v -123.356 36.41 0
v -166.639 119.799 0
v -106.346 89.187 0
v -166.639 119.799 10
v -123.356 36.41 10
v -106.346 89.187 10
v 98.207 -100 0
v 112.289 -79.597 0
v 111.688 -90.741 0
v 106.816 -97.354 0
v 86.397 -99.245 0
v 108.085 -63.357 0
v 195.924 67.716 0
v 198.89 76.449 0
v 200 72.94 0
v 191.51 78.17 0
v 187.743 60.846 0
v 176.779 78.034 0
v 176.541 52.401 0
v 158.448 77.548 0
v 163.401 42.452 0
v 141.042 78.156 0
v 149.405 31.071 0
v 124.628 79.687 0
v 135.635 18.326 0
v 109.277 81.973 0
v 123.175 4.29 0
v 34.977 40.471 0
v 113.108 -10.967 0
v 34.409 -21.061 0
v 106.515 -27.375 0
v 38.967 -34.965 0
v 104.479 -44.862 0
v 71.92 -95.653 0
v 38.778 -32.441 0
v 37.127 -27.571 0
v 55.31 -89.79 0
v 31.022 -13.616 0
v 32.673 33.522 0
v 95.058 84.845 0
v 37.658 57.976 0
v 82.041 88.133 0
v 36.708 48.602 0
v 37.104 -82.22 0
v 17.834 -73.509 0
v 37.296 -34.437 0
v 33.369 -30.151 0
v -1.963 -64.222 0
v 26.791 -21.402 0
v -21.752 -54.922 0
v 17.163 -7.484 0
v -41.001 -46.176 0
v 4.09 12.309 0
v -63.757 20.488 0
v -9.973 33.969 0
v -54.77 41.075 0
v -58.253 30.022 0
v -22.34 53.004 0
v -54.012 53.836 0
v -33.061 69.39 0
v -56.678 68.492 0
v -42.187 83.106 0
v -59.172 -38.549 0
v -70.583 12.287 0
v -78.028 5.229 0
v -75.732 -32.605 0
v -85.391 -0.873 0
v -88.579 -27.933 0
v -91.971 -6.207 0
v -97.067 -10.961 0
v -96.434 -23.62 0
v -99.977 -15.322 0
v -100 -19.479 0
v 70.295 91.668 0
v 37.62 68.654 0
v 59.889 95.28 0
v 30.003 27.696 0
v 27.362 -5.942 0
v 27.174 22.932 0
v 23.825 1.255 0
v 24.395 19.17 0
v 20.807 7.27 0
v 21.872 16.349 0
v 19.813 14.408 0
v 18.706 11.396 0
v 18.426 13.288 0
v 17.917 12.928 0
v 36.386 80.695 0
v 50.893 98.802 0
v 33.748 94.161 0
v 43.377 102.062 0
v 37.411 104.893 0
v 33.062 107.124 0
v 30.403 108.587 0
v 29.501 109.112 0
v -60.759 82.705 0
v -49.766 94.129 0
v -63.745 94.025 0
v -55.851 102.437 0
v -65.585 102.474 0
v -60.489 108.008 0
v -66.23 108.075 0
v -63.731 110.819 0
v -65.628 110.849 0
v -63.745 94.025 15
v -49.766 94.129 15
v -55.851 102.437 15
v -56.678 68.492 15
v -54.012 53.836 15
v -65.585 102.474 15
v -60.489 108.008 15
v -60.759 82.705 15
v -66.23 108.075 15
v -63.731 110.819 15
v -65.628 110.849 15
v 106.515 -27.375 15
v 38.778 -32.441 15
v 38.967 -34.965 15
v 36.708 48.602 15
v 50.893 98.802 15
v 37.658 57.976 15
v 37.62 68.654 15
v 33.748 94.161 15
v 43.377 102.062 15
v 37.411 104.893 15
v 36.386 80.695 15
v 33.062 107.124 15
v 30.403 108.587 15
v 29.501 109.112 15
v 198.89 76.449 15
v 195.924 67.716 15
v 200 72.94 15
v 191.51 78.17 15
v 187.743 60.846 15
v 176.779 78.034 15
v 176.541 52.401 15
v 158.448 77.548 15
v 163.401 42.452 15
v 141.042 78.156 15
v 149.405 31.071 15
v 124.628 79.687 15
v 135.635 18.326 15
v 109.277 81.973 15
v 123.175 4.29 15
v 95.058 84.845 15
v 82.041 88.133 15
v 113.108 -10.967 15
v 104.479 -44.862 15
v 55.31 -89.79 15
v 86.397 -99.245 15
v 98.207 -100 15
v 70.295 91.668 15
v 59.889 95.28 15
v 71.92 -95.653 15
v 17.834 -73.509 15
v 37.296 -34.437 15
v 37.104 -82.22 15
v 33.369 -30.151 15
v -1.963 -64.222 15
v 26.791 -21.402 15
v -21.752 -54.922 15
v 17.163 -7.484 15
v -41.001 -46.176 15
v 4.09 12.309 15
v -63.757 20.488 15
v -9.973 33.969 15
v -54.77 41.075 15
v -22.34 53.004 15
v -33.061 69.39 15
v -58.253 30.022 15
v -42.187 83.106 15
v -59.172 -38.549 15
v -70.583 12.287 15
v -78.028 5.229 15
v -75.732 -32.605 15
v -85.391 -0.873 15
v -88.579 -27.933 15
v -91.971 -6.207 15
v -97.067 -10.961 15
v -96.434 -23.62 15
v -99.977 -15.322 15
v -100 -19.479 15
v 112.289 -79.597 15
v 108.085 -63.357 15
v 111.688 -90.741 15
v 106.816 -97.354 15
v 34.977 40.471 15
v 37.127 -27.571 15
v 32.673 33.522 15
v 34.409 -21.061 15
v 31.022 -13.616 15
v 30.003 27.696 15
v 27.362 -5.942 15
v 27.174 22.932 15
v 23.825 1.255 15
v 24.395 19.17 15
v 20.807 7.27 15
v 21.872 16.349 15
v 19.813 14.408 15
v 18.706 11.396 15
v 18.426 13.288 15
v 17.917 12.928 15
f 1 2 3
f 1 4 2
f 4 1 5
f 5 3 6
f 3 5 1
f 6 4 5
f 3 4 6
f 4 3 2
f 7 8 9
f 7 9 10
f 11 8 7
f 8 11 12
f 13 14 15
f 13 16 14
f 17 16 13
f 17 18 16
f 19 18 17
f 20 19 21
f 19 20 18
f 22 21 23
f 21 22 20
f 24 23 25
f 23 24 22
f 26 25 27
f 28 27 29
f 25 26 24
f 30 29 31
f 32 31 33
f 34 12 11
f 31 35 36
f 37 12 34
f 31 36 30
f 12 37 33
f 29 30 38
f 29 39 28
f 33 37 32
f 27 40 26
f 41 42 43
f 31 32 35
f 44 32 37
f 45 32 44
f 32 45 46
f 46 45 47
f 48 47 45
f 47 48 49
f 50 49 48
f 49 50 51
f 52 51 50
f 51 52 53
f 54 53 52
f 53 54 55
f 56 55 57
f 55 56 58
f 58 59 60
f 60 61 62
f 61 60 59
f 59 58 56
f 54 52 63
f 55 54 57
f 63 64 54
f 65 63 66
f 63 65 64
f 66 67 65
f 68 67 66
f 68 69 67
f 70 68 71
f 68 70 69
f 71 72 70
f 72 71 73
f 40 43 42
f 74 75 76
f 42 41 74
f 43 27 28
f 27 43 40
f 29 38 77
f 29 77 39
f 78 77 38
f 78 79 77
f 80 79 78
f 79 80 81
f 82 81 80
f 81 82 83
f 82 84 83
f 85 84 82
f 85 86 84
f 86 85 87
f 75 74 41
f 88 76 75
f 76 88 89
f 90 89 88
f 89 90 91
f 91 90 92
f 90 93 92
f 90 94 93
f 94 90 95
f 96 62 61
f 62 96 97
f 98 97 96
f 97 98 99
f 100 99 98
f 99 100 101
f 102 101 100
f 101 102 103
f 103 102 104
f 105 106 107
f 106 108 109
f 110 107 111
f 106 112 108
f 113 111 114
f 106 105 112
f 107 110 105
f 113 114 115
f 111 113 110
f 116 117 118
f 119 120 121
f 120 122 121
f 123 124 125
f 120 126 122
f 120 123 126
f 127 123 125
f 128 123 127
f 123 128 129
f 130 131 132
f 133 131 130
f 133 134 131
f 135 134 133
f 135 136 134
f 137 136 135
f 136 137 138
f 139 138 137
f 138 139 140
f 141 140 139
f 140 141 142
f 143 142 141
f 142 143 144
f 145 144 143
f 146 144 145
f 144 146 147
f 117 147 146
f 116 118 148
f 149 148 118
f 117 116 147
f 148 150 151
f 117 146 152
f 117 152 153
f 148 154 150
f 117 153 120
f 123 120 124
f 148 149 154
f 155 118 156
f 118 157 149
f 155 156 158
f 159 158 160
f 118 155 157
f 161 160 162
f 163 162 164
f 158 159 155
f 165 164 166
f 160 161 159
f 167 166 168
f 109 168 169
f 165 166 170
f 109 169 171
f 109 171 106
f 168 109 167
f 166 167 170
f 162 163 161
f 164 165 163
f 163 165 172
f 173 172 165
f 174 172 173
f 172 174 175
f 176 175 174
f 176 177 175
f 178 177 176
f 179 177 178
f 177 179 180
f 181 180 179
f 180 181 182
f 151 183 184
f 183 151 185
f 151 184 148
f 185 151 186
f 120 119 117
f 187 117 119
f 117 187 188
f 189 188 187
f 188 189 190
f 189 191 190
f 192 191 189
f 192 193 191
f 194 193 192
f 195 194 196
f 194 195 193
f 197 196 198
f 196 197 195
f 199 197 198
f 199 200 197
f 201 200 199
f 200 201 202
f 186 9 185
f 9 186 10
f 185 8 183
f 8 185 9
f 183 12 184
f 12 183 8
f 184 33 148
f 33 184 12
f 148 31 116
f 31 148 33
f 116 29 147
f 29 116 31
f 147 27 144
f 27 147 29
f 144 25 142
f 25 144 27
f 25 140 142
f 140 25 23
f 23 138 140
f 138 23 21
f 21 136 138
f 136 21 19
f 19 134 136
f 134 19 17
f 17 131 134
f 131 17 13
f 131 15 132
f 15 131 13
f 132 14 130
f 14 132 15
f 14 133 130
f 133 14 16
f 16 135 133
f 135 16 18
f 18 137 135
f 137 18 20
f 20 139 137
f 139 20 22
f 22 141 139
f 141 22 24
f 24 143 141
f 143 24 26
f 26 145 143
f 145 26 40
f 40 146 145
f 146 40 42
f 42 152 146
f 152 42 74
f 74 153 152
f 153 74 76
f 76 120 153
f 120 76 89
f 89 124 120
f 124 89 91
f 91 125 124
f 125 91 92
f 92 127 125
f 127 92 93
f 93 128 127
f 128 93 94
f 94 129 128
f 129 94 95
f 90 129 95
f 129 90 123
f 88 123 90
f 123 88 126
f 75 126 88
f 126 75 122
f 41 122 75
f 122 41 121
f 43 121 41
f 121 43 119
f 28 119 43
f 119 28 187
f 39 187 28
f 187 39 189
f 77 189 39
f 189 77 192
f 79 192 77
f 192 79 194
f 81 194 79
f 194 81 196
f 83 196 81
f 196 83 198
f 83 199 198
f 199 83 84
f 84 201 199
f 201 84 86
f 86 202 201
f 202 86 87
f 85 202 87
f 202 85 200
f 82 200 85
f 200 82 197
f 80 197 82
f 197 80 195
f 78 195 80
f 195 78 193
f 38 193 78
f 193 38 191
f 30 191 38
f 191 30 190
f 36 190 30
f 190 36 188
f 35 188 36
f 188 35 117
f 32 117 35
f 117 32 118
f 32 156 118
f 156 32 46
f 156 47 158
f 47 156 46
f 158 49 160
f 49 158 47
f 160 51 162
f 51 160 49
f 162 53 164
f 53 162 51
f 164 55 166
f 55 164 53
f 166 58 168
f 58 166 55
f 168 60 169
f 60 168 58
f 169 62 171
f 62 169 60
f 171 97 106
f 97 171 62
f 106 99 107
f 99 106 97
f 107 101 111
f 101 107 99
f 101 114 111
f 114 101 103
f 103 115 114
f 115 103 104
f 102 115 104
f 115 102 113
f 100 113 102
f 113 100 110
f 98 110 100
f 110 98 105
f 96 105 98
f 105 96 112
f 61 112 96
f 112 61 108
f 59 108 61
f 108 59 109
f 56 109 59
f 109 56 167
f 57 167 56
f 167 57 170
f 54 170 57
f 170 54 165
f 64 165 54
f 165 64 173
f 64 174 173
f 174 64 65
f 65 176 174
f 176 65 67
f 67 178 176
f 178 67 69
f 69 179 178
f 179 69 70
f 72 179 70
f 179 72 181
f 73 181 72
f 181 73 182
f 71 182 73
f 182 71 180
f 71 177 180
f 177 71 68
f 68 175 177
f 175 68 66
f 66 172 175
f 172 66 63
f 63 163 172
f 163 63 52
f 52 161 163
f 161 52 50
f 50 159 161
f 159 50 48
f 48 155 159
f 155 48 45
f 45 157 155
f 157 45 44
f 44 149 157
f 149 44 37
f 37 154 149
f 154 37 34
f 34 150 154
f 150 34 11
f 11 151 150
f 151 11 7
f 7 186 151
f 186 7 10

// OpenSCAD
// file: bezier_curves.scad
// Width: 300.0, Height: 210.84904916813773
module bezier_curves() {
    polygon(points=[
        [129.50063556158614, 209.1120295589388],
        [133.74846057711048, 194.1613740123652],
        [136.38563815666978, 180.69539871636377],
        [137.61962974733922, 168.65371796536743],
        [137.65789679619388, 157.97594605380925],
        [136.707900750309, 148.60169727612217],
        [134.9771030567596, 140.47058592673926],
        [132.67296516262093, 133.52222630009348],
        [130.00294851496804, 127.69623269061778],
        [127.17451456087612, 122.93221939274528],
        [124.39512474742028, 119.16980070090892],
        [121.87224052167568, 116.34859090954168],
        [119.81332333071748, 114.40820431307667],
        [118.42583462162075, 113.28825520594674],
        [117.91723584146071, 112.928357882585],
        [117.9172358414608, 112.928357882585],
        [118.70576650097378, 111.39608910688686],
        [120.80702733998017, 107.26977804379504],
        [123.82452164918118, 101.25516758931309],
        [127.3617527192781, 94.05800063944491],
        [131.02222384097206, 86.38402009019408],
        [134.40943830496434, 78.93896883756443],
        [137.12689940195617, 72.42858977755965],
        [138.77811042264878, 67.55862580618344],
        [138.96657465774334, 65.03481981943958],
        [137.29579539794105, 65.56291471333171],
        [133.36927593394321, 69.84865338386358],
        [126.79051955645103, 78.59777872703894],
        [117.16302955616572, 92.5160336388616],
        [104.09030922378844, 112.30916101533509],
        [104.09030922378857, 112.30916101533522],
        [90.0273819732726, 133.96943825295668],
        [77.66025522902768, 153.00380840808842],
        [66.93891509575825, 169.3900101472046],
        [57.81334767816869, 183.1057821367796],
        [50.233539080963475, 194.12886304328774],
        [44.14947540884698, 202.43699153320335],
        [39.51114276652361, 208.00790627300066],
        [36.26852725869782, 210.819345929154],
        [34.37161499007403, 210.84904916813773],
        [33.77039206535661, 208.07475465642614],
        [34.41484458925001, 202.47420106049347],
        [36.254958666458656, 194.02512704681416],
        [39.24072040168692, 182.70527128186234],
        [43.322115899639265, 168.49237243211246],
        [43.322115899639236, 168.49237243211263],
        [45.98838760251184, 153.83595497080512],
        [45.22968815261544, 141.07509755100332],
        [41.7473648758352, 130.02187962656137],
        [36.24276509805635, 120.4883806513334],
        [29.41723614516407, 112.28668007917348],
        [21.972125343043583, 105.2288573639359],
        [14.608780017580068, 99.12699195947472],
        [8.028547494658753, 93.79316331964402],
        [2.932775100164835, 89.03945089829806],
        [0.02281015998350622, 84.67793414929092],
        [0.0, 80.52069252647671],
        [3.5656919460994763, 76.37980548370966],
        [11.421233324167147, 72.06735247484382],
        [24.267971460088262, 67.39541295373333],
        [24.267971460088276, 67.39541295373316],
        [40.82804302516928, 61.45112102717873],
        [58.9994987141772, 53.82353433659562],
        [78.24755729608708, 45.077617637759616],
        [98.03743753987402, 35.7783356864466],
        [117.83435821451305, 26.490653238432422],
        [137.1035380889793, 17.779535049493017],
        [155.31019593224775, 10.20994587540418],
        [171.91955051329356, 4.346850471941844],
        [186.39682060109172, 0.7552135948818082],
        [198.20722496461732, 0.0],
        [206.81598237284547, 2.6461744430722836],
        [211.68831159475124, 9.258701679874402],
        [212.2894313993096, 20.402546466182404],
        [208.08456055549576, 36.64267355777209],
        [208.08456055549576, 36.64267355777203],
        [204.47948838256403, 55.13843918093128],
        [206.51471677353197, 72.62540633933182],
        [213.1075469546558, 89.0328363581886],
        [223.17528015219173, 104.2899905627166],
        [235.63521759239583, 118.32613027813079],
        [249.4046605015244, 131.07051682964612],
        [263.40091010583353, 142.45241154247765],
        [276.5412676315795, 152.40107574184012],
        [287.74303430501845, 160.84577075294874],
        [295.9235113524066, 167.71575790101832],
        [300.0, 172.94029851126388],
        [298.889801474055, 176.4486539089005],
        [291.5102170008277, 178.17008541914294],
        [276.7785478065743, 178.0338543672063],
        [276.7785478065744, 178.03385436720643],
        [258.44850026238, 177.54820916664818],
        [241.04192870964724, 178.15574221326733],
        [224.62835633010891, 179.68721720900456],
        [209.27730630549783, 181.9733978558005],
        [195.0583018175467, 184.84504785559588],
        [182.04086604798815, 188.13293091033137],
        [170.29452217855507, 191.66781072194755],
        [159.8887933909802, 195.28045099238523],
        [150.8932028669962, 198.80161542358496],
        [143.37727378833588, 202.0620677174875],
        [137.41052933673194, 204.89257157603348],
        [133.06249269391716, 207.1238907011636],
        [130.4026870416243, 208.58678879481852],
        [129.50063556158605, 209.1120295589389],
        [129.5006355615861, 209.1120295589388],
        [129.50063556158614, 209.1120295589388],
    ]);
}
// file: straight_lines.scad
// Width: 60.292721, Height: 83.38827
module straight_lines() {
    polygon(points=[
        [33.361301, 159.79872],
        [76.643843, 76.41045],
        [76.643843, 76.41045],
        [93.654022, 129.18666],
        [33.361301, 159.79872],
    ]);
}
// main file
// Load the generated SCAD files
use <straight_lines.scad>
use <bezier_curves.scad>

// Use the polygon modules defined in the included files
translate([-200, -40, 0]) {
    linear_extrude(10)
    straight_lines();
}

translate([-100, -100, 0]) {
    linear_extrude(15)
    bezier_curves();
}
